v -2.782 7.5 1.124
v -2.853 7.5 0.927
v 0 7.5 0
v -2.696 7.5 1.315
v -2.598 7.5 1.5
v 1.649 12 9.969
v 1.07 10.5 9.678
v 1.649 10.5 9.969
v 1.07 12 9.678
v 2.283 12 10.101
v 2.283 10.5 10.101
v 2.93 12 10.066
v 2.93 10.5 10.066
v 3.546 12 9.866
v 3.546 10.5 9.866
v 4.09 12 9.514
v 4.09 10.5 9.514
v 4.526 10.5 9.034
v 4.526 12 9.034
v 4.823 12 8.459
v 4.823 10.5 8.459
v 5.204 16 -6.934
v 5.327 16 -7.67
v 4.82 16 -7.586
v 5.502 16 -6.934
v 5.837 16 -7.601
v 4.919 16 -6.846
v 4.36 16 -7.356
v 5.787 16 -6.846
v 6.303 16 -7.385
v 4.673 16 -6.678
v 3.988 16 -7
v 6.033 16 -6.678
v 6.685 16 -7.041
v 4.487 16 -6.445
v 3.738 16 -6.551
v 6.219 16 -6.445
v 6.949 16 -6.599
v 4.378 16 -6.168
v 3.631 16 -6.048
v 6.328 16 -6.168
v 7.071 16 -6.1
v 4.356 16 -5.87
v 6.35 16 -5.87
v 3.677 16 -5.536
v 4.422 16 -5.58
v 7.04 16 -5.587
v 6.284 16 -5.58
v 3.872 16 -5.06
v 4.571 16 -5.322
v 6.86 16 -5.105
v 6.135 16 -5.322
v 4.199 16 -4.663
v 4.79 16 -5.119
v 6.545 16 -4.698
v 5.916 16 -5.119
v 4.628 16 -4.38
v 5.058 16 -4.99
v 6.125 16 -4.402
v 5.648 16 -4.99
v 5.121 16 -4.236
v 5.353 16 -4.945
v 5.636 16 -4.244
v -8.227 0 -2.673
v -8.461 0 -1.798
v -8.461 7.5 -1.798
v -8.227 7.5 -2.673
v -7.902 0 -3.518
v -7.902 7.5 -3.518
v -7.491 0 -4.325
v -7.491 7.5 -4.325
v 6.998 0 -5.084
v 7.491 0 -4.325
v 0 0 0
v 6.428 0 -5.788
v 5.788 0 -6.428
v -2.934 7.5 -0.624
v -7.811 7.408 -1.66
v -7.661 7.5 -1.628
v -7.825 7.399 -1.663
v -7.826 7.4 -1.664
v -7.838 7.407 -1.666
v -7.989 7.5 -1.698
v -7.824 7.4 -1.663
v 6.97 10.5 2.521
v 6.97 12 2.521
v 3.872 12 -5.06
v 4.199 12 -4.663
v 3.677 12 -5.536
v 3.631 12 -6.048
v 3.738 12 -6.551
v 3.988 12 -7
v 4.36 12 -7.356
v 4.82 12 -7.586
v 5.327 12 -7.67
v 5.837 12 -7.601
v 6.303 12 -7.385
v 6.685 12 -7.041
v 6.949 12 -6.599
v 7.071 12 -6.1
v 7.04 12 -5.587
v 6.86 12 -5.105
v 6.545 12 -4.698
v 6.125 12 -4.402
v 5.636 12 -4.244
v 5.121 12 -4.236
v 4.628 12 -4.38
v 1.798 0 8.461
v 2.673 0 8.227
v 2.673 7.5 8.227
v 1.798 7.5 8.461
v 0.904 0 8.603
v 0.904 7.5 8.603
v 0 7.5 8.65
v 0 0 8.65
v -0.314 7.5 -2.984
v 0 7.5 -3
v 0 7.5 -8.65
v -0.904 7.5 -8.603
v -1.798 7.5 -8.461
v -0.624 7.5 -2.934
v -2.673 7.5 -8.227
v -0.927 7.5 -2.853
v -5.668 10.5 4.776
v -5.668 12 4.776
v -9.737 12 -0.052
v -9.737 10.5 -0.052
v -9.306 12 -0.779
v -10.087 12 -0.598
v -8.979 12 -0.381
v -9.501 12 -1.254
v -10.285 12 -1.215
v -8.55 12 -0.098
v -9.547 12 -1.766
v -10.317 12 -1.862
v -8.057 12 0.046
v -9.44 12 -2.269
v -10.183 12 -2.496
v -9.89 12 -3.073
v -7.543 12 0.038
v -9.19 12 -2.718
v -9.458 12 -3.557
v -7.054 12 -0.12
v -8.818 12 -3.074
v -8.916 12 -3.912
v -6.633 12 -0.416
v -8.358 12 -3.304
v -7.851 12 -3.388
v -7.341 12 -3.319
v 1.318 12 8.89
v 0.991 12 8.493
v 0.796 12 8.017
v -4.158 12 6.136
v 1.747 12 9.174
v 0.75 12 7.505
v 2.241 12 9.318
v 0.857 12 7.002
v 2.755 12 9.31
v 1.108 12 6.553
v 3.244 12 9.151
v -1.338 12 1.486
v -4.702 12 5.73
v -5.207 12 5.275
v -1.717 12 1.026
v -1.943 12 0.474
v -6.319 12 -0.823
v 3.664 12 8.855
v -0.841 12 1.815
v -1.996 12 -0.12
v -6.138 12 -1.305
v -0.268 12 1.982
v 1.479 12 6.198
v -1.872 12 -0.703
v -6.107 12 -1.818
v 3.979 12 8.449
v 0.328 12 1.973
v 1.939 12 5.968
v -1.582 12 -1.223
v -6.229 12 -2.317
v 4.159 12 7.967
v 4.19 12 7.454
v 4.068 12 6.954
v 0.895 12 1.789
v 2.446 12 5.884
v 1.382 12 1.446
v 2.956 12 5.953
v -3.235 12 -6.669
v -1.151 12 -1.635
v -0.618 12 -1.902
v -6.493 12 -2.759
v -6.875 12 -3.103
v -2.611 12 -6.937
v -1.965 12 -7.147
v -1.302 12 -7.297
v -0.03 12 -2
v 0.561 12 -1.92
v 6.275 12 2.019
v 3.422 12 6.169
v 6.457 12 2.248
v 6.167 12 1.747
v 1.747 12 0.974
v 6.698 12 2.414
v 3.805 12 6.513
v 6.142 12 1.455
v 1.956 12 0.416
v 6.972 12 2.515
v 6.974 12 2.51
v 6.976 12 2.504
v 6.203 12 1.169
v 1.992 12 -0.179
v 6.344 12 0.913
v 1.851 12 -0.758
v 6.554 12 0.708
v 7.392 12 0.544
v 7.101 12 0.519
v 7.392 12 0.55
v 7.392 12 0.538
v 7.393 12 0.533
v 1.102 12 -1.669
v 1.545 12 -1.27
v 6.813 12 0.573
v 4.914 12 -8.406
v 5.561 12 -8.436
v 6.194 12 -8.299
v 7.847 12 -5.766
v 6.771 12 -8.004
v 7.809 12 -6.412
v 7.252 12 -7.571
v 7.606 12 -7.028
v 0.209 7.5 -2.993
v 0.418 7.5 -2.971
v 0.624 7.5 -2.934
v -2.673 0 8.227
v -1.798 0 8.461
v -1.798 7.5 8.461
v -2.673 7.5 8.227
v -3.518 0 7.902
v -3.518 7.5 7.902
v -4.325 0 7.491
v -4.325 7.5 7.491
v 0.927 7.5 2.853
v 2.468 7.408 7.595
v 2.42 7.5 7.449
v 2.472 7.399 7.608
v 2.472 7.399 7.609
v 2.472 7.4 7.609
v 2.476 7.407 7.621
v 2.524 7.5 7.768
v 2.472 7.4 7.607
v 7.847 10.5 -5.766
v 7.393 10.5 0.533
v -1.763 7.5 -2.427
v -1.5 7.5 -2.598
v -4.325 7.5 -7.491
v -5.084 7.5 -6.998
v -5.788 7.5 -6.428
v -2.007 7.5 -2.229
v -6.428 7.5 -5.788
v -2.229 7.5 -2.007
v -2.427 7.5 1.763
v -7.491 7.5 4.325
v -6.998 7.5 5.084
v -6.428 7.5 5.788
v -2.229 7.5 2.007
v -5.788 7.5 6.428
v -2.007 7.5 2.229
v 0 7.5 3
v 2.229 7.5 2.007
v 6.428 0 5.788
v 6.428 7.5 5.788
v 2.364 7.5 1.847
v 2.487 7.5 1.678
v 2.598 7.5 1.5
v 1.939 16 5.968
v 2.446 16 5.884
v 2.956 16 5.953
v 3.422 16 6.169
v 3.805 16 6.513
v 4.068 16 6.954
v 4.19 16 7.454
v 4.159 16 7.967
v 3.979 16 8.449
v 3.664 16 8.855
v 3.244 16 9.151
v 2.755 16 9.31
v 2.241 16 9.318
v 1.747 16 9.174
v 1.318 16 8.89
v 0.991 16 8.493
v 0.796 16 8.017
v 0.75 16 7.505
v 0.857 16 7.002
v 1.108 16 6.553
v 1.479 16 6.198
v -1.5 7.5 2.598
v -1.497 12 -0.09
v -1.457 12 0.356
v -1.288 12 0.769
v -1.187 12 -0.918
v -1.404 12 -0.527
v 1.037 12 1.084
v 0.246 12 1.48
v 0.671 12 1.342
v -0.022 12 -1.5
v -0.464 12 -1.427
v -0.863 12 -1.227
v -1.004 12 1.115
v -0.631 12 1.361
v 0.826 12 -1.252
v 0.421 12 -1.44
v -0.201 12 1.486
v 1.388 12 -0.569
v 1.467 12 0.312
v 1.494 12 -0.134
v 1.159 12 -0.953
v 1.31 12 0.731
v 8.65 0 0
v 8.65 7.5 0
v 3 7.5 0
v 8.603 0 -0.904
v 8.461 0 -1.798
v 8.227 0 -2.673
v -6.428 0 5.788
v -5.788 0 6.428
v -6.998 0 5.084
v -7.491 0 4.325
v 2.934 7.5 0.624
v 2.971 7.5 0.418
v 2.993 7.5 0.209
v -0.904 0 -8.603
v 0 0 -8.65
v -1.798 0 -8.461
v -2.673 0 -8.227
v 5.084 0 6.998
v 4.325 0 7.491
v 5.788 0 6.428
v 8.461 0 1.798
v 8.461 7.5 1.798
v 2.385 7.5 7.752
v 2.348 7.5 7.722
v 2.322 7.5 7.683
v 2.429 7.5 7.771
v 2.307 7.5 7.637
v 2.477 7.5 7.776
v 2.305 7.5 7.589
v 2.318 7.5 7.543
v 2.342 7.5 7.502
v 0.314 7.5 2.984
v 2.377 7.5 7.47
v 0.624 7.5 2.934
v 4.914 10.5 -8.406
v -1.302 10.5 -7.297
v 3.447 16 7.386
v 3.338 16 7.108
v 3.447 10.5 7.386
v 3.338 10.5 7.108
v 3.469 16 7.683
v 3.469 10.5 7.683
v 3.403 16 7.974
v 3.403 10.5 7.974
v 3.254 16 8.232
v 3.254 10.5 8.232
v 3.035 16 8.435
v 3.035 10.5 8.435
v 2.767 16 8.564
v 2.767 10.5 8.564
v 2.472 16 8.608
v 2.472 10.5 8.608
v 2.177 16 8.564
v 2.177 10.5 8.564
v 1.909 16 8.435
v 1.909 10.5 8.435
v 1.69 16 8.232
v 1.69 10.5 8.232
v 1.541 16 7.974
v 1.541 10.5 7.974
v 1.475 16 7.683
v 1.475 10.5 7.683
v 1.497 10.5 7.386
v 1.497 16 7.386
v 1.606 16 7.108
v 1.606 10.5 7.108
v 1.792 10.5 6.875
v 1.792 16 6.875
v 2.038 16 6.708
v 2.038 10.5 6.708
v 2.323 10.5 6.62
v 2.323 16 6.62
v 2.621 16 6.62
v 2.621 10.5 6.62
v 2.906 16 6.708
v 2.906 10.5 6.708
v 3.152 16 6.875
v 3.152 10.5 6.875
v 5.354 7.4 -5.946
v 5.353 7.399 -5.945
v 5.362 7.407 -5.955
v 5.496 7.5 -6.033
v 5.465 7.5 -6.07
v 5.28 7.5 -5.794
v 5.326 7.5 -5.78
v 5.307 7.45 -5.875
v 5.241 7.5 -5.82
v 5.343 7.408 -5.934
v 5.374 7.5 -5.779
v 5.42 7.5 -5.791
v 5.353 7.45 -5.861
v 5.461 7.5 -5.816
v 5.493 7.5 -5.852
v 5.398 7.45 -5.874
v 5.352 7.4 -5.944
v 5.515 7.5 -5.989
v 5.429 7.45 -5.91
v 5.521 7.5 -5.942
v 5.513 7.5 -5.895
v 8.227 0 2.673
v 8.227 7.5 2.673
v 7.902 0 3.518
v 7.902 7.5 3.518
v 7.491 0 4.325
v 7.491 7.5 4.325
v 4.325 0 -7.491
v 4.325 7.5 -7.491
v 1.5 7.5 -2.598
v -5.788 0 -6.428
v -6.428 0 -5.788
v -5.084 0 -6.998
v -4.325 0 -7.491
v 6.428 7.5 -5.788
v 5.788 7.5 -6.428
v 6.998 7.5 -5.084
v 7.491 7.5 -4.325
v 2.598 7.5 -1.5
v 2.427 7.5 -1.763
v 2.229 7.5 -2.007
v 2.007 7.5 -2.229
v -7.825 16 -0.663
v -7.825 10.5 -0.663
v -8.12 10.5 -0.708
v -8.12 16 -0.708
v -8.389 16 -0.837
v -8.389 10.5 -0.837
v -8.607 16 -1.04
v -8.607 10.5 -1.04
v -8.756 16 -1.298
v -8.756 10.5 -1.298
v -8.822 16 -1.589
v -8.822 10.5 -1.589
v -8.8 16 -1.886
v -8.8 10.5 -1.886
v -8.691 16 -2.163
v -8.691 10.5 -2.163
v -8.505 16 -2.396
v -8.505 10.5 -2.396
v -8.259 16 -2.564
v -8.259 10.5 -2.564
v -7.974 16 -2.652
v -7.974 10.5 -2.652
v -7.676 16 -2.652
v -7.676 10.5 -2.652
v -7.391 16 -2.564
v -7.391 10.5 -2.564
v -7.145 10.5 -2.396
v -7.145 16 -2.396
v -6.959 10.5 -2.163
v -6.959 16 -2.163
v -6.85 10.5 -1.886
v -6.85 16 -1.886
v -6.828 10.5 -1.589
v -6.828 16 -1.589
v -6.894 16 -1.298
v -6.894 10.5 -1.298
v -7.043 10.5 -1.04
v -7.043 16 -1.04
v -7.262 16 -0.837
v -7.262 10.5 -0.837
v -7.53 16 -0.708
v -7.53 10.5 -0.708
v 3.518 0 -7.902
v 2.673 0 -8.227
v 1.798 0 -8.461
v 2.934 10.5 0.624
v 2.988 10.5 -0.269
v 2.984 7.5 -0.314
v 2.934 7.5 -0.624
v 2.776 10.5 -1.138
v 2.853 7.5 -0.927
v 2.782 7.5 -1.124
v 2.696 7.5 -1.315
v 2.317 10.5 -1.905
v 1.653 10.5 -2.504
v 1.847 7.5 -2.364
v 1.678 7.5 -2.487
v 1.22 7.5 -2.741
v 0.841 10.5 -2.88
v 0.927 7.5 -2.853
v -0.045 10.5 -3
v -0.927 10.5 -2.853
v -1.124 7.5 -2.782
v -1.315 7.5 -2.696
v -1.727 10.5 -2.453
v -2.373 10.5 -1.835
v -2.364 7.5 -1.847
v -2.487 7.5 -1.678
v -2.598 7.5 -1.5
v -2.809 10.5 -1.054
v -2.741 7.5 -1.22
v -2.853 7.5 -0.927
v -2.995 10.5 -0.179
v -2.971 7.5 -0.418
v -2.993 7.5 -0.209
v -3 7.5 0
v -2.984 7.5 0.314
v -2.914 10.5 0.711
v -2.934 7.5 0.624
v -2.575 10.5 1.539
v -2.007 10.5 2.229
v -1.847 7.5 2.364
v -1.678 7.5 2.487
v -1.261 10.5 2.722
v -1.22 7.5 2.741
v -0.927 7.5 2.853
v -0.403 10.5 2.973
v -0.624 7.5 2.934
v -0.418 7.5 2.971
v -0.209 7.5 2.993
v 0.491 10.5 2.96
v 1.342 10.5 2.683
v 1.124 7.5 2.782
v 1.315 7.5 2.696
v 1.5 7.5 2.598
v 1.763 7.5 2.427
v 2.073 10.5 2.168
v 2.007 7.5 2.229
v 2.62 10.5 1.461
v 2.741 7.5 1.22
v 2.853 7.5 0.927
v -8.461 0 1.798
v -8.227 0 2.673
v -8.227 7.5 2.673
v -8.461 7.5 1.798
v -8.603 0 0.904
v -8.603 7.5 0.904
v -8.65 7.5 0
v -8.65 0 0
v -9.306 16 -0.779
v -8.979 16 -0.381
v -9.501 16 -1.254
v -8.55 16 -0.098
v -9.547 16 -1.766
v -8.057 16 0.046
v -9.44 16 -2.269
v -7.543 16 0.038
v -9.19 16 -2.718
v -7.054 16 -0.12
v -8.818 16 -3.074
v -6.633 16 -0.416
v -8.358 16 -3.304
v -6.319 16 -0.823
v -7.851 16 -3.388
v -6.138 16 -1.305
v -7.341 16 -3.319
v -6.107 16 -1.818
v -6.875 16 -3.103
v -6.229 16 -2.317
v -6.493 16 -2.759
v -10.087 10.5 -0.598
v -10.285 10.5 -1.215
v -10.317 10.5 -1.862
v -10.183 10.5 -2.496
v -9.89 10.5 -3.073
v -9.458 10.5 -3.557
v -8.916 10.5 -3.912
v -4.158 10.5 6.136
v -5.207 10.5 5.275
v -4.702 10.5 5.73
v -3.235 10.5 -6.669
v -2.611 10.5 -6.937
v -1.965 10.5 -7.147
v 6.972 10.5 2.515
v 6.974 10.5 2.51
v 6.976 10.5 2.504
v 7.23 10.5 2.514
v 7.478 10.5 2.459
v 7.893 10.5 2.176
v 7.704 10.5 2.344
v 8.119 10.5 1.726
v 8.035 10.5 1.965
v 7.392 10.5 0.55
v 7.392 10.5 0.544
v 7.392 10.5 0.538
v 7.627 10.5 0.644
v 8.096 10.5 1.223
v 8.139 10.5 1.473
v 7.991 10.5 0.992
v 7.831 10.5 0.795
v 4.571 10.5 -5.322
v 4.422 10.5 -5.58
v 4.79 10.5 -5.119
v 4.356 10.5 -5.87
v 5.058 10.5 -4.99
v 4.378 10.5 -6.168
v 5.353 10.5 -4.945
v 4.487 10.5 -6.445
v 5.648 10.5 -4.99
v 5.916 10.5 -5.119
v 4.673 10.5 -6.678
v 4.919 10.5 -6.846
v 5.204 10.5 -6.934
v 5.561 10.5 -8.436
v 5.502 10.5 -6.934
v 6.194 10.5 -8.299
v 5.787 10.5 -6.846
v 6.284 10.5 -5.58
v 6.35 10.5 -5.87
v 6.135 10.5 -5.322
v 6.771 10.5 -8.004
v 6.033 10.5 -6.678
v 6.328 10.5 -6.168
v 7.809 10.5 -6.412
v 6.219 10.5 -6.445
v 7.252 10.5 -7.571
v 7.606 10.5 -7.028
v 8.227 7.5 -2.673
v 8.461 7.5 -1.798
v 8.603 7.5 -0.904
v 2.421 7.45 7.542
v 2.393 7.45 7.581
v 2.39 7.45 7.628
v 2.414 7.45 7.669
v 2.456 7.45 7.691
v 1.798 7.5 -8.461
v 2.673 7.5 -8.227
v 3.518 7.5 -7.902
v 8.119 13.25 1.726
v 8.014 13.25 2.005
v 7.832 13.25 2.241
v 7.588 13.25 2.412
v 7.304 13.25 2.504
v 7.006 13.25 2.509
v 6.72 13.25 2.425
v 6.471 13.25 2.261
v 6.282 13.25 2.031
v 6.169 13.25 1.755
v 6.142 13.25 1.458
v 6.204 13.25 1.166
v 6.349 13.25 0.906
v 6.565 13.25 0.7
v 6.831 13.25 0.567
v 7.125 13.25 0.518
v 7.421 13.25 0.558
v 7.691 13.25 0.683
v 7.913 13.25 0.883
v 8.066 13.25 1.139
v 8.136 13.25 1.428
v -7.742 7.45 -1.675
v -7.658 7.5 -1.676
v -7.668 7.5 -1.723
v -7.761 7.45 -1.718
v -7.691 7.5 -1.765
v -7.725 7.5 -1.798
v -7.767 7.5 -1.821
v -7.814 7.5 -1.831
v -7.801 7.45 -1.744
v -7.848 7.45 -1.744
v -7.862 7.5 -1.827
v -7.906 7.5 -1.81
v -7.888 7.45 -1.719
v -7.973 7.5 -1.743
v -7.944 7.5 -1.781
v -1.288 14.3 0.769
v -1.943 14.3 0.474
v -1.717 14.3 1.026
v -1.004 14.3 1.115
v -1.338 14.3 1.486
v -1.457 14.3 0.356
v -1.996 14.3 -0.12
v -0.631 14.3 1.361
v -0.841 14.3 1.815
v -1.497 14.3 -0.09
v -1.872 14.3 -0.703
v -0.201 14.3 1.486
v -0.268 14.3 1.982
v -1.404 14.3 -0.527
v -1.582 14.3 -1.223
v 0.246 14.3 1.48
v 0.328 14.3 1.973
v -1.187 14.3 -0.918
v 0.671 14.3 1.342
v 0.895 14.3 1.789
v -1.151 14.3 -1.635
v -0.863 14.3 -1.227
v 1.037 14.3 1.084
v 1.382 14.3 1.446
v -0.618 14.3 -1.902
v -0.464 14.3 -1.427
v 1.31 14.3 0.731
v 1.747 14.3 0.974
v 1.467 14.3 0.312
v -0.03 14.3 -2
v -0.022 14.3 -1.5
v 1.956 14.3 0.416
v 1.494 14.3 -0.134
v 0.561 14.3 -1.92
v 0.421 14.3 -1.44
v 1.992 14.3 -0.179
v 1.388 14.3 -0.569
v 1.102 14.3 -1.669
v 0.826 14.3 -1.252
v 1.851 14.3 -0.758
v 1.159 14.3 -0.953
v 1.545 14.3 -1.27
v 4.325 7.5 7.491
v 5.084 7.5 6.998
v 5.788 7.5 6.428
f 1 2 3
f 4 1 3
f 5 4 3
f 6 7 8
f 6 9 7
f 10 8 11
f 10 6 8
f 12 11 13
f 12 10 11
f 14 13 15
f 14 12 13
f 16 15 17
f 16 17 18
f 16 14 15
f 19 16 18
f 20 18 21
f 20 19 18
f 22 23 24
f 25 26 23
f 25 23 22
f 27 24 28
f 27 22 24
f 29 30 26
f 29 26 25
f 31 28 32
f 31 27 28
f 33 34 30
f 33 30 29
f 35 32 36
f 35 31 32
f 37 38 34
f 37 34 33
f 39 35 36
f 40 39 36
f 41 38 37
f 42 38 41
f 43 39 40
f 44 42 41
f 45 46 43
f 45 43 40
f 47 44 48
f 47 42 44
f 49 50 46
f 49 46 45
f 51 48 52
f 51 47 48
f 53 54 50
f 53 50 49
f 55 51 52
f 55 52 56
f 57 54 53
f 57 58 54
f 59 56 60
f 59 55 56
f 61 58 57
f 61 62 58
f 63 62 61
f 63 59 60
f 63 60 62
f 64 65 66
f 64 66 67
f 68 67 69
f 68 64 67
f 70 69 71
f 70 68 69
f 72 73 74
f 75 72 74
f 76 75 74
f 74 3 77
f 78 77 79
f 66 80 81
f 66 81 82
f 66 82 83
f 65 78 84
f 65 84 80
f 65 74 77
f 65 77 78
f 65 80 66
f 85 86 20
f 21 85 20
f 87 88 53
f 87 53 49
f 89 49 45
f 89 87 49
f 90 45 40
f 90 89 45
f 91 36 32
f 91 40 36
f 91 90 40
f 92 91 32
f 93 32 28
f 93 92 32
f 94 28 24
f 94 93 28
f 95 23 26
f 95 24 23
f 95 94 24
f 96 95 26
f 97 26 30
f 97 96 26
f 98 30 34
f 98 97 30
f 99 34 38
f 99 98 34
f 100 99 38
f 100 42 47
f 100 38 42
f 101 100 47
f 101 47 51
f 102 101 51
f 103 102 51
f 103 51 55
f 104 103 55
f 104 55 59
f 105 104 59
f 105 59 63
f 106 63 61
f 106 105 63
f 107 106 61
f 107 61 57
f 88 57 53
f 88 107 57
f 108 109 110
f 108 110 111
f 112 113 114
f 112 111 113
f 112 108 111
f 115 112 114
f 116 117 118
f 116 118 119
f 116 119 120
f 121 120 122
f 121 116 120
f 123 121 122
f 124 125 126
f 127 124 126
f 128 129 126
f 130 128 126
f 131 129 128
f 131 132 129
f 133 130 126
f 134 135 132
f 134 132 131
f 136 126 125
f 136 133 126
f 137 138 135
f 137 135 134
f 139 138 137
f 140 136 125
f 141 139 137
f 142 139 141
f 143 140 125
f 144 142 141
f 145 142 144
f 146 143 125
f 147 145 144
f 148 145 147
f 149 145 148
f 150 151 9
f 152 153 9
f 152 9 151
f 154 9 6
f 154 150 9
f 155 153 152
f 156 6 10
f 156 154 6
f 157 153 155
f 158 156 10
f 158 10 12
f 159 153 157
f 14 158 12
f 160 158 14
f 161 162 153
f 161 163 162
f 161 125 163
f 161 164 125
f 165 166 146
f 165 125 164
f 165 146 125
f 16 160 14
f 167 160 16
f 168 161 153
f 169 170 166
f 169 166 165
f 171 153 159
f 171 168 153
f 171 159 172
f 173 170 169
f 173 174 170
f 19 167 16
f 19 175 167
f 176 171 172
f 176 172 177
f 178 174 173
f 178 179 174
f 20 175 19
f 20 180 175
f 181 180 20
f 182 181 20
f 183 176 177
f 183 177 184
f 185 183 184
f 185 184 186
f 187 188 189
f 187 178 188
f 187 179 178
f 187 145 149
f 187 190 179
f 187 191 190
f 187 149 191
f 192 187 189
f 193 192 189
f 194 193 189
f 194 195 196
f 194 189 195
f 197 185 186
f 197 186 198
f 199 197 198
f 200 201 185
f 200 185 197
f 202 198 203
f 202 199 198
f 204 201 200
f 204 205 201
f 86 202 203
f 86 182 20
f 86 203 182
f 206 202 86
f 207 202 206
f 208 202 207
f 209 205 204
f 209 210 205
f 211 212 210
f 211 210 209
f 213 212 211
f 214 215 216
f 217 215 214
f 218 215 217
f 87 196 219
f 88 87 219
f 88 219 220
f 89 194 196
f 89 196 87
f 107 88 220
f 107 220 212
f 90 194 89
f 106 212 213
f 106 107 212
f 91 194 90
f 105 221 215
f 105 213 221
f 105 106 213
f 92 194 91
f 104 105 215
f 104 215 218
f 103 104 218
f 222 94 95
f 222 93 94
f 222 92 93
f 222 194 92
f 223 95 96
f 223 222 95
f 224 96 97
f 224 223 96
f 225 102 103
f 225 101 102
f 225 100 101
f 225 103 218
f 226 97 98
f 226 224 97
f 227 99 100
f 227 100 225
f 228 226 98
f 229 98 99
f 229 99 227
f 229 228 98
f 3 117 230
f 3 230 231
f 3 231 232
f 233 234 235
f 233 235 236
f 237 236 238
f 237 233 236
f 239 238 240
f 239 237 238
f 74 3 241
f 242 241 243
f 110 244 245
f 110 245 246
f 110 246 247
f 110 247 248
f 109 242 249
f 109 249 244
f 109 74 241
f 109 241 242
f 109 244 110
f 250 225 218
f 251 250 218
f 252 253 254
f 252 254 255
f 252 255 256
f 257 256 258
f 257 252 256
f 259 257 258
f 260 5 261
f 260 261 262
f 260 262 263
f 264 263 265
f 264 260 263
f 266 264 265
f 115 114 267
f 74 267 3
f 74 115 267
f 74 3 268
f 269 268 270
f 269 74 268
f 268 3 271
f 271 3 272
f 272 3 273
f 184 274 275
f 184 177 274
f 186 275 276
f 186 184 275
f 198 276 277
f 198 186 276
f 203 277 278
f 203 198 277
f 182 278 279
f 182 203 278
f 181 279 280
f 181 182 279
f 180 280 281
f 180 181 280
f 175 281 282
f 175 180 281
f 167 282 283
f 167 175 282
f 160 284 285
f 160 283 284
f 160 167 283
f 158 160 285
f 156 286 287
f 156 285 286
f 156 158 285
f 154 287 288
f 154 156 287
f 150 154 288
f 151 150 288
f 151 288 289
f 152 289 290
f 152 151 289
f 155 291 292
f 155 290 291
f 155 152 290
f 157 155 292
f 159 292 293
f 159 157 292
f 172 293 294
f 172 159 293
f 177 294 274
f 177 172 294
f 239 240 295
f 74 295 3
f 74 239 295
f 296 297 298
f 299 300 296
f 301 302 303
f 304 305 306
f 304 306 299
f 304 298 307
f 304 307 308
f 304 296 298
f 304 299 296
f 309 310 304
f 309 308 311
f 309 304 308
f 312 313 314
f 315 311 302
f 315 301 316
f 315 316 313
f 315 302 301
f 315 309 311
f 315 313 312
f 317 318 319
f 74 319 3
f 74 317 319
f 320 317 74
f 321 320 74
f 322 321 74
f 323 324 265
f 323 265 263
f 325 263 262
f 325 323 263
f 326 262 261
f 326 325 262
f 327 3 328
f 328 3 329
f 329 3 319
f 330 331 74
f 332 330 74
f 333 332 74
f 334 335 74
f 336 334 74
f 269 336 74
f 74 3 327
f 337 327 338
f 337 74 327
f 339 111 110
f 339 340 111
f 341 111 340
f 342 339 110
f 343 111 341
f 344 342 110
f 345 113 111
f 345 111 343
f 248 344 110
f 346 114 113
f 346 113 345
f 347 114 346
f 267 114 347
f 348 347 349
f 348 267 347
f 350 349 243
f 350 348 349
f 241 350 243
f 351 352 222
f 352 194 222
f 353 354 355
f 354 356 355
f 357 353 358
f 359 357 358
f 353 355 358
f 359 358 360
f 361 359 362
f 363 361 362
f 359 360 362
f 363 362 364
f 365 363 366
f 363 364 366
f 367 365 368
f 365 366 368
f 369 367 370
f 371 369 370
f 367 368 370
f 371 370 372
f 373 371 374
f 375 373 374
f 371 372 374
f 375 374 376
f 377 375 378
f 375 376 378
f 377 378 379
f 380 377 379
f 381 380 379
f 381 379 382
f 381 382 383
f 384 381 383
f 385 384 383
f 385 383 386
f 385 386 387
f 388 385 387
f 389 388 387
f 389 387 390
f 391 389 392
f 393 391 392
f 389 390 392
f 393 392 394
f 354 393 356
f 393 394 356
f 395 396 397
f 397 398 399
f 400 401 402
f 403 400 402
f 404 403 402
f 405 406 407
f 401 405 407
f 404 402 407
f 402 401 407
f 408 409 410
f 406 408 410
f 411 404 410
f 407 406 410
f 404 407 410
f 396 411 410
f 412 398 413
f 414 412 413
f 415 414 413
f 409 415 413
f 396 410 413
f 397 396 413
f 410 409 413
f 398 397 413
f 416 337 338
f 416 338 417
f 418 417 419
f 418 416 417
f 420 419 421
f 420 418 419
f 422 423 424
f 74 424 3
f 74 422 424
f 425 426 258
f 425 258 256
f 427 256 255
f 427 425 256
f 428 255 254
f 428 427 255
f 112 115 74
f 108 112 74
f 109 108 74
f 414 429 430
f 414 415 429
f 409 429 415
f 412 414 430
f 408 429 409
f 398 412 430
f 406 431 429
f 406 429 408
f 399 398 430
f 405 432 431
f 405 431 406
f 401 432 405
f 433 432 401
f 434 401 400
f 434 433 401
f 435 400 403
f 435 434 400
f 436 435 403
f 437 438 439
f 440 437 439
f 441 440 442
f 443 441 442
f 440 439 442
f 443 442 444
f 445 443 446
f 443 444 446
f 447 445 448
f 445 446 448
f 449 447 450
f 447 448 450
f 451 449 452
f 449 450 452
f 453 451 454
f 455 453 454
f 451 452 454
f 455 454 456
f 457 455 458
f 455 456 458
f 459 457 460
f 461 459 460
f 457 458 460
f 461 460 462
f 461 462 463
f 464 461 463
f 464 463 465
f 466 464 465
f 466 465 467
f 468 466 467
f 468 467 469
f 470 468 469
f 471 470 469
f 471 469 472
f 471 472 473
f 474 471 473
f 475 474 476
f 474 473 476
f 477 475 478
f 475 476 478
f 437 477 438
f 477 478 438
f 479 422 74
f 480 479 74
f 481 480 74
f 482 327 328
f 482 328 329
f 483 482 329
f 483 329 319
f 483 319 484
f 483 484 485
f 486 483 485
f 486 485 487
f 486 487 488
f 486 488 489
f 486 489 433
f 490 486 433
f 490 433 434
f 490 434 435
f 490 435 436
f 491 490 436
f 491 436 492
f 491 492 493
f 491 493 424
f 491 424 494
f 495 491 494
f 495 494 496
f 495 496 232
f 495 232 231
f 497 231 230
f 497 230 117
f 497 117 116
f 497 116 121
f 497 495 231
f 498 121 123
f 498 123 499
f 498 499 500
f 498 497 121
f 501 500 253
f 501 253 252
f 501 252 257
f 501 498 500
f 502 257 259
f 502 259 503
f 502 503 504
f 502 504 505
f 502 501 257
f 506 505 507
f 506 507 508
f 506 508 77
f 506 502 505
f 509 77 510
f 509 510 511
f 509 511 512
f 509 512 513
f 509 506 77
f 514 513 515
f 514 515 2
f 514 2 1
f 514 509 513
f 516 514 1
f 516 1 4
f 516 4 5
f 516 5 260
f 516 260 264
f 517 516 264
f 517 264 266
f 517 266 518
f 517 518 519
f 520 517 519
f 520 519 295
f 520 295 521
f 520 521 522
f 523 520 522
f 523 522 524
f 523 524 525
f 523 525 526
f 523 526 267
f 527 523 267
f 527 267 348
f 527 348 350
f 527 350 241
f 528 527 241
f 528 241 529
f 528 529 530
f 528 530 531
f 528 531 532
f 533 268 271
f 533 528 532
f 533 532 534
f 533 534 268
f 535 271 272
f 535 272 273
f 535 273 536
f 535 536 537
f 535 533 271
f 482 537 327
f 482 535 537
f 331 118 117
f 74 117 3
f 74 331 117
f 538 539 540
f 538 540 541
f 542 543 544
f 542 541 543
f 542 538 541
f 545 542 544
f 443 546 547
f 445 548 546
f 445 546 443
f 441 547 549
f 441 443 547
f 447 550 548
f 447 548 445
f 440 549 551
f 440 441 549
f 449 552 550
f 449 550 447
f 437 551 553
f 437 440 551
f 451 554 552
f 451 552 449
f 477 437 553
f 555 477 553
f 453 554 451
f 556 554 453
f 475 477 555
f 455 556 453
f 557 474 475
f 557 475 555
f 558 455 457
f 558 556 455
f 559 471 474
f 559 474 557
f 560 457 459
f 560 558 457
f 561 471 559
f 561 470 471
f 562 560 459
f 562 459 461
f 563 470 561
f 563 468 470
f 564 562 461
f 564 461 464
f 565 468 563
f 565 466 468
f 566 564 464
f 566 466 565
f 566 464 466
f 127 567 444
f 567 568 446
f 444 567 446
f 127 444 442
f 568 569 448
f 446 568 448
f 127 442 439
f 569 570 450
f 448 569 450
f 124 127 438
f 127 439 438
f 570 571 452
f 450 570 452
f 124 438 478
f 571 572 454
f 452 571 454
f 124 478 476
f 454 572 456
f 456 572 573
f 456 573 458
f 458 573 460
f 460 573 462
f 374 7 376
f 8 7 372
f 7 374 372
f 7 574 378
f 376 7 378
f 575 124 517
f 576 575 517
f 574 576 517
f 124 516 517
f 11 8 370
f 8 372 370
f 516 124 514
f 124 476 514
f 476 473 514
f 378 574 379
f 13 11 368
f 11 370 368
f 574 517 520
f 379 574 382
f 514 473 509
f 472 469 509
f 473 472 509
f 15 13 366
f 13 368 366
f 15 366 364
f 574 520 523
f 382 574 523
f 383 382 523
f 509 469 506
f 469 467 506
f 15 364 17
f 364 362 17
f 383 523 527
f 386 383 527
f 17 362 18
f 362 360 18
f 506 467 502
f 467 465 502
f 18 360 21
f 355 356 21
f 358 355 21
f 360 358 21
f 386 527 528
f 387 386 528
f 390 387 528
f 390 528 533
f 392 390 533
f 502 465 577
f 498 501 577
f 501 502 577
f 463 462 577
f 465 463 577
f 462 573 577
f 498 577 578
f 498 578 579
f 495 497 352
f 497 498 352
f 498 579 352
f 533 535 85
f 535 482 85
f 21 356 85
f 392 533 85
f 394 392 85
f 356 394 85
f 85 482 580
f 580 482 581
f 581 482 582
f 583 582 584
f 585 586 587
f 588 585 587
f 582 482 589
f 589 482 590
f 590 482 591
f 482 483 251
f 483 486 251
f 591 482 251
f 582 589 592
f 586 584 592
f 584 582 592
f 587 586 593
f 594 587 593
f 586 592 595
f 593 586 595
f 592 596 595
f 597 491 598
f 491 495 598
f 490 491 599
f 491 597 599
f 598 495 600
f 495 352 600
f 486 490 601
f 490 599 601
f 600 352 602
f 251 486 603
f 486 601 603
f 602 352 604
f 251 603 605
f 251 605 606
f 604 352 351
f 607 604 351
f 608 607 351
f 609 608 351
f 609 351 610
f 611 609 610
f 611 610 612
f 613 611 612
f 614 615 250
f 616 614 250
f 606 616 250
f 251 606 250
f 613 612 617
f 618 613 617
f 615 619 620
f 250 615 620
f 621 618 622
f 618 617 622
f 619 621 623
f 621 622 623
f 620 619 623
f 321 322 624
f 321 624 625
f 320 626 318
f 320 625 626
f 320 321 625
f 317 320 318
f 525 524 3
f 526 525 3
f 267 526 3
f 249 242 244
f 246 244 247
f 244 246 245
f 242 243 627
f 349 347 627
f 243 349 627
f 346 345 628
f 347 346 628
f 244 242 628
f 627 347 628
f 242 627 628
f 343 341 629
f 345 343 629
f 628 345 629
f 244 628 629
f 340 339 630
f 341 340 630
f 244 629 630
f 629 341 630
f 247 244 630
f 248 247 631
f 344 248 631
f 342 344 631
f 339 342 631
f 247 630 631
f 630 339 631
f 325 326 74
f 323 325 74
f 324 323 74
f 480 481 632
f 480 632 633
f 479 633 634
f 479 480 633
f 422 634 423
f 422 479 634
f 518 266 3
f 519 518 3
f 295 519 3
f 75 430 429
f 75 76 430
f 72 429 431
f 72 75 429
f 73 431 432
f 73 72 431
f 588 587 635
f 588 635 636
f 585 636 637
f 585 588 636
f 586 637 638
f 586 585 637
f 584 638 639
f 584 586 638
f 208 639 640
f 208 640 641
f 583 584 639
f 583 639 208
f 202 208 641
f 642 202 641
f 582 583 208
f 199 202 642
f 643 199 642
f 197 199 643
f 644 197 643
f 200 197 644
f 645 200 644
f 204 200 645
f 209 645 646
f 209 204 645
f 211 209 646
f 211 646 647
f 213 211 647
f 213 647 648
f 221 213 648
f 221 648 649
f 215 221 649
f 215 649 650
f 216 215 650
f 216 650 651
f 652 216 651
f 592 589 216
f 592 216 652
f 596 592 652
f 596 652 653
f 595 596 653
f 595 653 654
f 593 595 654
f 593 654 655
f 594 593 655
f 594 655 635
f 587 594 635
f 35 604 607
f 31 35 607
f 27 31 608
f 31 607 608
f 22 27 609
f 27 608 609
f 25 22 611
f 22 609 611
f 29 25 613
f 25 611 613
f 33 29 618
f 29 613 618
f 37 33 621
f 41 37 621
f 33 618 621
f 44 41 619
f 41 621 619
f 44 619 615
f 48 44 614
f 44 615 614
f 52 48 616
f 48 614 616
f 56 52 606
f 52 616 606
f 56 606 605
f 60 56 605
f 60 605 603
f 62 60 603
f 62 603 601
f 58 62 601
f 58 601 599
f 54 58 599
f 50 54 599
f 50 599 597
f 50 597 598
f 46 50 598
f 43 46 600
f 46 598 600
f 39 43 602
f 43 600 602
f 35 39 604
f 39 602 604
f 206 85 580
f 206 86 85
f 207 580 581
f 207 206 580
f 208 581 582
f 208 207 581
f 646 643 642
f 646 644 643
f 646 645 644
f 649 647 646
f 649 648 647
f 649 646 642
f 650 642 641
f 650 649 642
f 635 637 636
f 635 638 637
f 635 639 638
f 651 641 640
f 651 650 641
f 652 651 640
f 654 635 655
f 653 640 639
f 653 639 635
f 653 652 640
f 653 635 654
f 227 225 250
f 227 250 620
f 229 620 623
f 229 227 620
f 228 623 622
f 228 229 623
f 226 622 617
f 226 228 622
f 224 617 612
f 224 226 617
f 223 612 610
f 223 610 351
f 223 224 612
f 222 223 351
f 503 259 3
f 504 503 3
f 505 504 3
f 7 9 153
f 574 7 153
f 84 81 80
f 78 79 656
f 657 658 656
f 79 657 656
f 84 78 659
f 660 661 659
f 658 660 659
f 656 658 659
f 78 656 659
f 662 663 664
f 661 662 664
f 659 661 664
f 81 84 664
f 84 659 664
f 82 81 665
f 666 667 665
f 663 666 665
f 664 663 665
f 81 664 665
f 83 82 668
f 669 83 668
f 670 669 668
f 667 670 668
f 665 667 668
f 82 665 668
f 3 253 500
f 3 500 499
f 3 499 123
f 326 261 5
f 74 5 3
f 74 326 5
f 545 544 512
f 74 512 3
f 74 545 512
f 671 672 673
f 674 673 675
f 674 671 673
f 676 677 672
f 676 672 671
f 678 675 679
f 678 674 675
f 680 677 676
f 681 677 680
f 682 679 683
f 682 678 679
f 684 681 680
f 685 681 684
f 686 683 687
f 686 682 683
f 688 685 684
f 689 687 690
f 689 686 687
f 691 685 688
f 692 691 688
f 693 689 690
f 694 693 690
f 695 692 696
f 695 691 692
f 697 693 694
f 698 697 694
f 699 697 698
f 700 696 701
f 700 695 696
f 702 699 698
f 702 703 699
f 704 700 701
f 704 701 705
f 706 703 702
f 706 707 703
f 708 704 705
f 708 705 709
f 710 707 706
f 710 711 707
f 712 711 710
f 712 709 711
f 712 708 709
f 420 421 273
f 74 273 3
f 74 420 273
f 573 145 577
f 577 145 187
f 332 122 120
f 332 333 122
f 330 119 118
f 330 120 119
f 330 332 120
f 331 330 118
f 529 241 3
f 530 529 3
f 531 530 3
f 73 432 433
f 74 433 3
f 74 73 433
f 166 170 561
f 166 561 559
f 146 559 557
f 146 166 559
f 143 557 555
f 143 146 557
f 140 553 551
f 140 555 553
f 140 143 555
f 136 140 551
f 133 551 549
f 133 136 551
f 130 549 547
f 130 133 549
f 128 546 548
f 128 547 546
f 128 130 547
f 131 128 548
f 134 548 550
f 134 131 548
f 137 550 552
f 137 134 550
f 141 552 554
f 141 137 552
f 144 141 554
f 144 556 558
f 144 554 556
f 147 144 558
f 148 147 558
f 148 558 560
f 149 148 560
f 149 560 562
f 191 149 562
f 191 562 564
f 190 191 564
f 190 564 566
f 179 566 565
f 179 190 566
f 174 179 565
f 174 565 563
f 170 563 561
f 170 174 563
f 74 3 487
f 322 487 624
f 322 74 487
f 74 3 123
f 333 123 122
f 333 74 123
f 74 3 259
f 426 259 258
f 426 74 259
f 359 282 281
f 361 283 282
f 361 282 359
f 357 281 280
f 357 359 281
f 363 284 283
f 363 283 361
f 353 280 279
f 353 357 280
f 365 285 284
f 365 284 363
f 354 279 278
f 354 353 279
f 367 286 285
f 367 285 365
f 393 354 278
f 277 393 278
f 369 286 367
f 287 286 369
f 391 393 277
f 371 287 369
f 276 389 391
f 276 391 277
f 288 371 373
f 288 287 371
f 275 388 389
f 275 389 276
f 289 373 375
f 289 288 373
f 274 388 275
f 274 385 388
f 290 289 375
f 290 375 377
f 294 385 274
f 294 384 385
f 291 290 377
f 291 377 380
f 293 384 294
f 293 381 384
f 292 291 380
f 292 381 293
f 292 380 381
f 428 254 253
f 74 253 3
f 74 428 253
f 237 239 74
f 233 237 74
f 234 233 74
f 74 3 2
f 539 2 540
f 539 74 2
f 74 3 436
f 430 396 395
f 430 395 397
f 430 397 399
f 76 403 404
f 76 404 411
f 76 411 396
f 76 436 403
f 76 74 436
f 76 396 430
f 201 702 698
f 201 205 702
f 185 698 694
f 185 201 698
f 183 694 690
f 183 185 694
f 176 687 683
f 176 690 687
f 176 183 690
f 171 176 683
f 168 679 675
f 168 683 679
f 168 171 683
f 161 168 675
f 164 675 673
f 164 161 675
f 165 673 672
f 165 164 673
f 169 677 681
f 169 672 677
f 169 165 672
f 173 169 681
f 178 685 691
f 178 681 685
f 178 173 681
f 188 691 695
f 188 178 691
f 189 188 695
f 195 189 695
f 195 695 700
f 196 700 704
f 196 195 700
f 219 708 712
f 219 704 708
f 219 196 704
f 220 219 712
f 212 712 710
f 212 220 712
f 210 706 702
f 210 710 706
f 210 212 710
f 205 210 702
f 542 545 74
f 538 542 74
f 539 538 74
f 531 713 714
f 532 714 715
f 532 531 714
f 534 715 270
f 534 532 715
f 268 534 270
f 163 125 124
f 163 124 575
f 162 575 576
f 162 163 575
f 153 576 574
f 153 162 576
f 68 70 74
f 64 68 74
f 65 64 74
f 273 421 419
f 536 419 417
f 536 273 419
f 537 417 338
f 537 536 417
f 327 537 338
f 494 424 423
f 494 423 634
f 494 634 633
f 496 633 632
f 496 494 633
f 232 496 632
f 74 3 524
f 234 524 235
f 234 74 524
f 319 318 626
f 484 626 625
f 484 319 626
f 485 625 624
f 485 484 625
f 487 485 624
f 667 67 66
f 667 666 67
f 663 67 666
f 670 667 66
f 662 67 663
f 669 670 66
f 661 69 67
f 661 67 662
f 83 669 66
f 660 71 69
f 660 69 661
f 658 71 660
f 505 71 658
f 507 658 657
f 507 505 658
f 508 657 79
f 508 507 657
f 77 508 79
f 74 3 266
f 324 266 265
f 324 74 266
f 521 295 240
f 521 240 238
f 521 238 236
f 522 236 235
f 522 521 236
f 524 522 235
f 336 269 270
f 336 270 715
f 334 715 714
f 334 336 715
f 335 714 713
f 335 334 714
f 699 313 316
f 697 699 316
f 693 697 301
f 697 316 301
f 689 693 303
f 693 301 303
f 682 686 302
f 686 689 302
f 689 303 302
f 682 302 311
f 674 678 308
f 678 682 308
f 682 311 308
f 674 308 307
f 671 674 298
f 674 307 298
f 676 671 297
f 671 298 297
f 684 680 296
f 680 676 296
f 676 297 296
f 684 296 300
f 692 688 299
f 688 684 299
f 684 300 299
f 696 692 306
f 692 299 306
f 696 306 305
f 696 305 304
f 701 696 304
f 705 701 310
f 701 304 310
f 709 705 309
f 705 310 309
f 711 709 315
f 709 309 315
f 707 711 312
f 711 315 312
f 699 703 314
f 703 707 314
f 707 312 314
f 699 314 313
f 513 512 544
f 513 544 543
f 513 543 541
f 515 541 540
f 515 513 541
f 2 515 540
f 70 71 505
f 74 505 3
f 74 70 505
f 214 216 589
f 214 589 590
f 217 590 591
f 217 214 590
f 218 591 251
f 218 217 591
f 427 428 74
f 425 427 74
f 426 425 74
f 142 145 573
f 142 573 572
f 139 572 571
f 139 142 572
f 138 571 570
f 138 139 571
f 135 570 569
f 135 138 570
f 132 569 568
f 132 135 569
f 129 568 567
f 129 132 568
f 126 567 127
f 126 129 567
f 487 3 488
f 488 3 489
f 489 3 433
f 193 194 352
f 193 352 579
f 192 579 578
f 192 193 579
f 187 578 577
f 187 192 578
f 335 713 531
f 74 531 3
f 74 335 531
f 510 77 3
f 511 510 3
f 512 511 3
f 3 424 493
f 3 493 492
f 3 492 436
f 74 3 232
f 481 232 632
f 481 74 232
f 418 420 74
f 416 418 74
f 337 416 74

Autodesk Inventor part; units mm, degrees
ref_plane "YZ Plane" through (0, 0, 0) normal (1, 0, 0) x (0, 1, 0)
ref_plane "XZ Plane" through (0, 0, 0) normal (0, 1, 0) x (-1, 0, 0)
sketch "Sketch1" plane through (0, 0, 0) normal (0, 1, 0) x (-1, 0, 0)
  arc A0 (0, -8.65) -> (2.673, -8.2266) centre (0, 0) ccw
  line L0 (0, 0) -> (2.673, -8.2266) construction
  line L1 (0, 0) -> (0, -8.65) construction
  line L2 (0, 0) -> (2.673, -8.2266)
  line L3 (0, -8.65) -> (0, 0)
  dimension "d0" = 8.65
  dimension "d1" = 18
extrude "Extrusion1" add sketch "Sketch1" along normal blind 7.5
pattern_circular "Circular Pattern1" count 12 over 360 about axis through (0, -10, 0) along (0, 1, 0) of "Extrusion1"
ref_plane "Work Plane1" through (-8.461, 12, -1.7984) normal (0, 1, 0) x (0.9781, 0, 0.2079)
sketch "Sketch2" plane through (-8.461, 12, -1.7984) normal (0, 1, 0) x (0.9781, 0, 0.2079)
  line L0 (8.65, 0) -> (0, 0) projected
  circle A0 centre (0.65, 0) radius 2.5
  circle A1 centre (12.65, -6.9282) radius 2.5
  circle A2 centre (12.65, 6.9282) radius 2.5
  line L1 (5.859, 6.8666) -> (11.7086, 9.2442)
  line L2 (15.1264, 7.271) -> (15.9921, 1.0162)
  line L3 (15.9921, -1.0162) -> (15.1264, -7.271)
  line L4 (11.7086, -9.2442) -> (5.859, -6.8666)
  line L5 (4.325, -7.4911) -> (8.65, 0) projected
  line L6 (4.0989, -5.8503) -> (-0.885, -1.9732)
  line L7 (-0.885, 1.9732) -> (4.0989, 5.8503)
  arc A3 (15.9921, -1.0162) -> (15.9921, 1.0162) centre (8.65, 0) ccw
  arc A4 (5.859, 6.8666) -> (4.0989, 5.8503) centre (8.65, 0) ccw
  arc A5 (4.0989, -5.8503) -> (5.859, -6.8666) centre (8.65, 0) ccw
  point P0 (15.1264, 7.271)
  point P1 (-0.885, 1.9732)
  dimension "d9" = 5
  dimension "d12" = 360
  dimension "d23" = 8
extrude "Extrusion2" add sketch "Sketch2" against normal blind 1.5
sketch "Sketch3" plane through (-8.461, 12, -1.7984) normal (0, 1, 0) x (0.9781, 0, 0.2079)
  circle A0 centre (8.65, 0) radius 3
  dimension "d16" = 6
extrude "Extrusion3" add sketch "Sketch3" against normal up to surface (4.5 mm away)
sketch "Sketch4" plane through (-8.461, 12, -1.7984) normal (0, 1, 0) x (0.9781, 0, 0.2079)
  line L0 (8.65, 0) -> (0, 0) projected
  circle A0 centre (0.65, 0) radius 1.725
  dimension "d19" = 3.45
  dimension "d20" = 8
extrude "Extrusion4" add sketch "Sketch4" along normal blind 4
hole "Hole1" at (-7.8252, 16, -1.6633) direction (0, -1, 0) diameter 2 depth 8 tip angle 118
pattern_circular "Circular Pattern2" count 3 over 360 about axis through (0, -10, 0) along (0, 1, 0) of "Extrusion4", "Hole1"
sketch "Sketch5" plane through (-8.461, 12, -1.7984) normal (0, 1, 0) x (0.9781, 0, 0.2079)
  line L0 (8.65, 0) -> (17.3, 0) projected
  circle A0 centre (15.95, 0) radius 1
  dimension "d36" = 2
  dimension "d37" = 7.3
extrude "Extrusion5" add sketch "Sketch5" along normal blind 1.25 and the other way blind 1.5
sketch "Sketch6" plane through (-8.461, 12, -1.7984) normal (0, 1, 0) x (0.9781, 0, 0.2079)
  circle A0 centre (8.65, 0) radius 2
  circle A1 centre (8.65, 0) radius 1.5
  dimension "d42" = 4
  dimension "d43" = 3
extrude "Extrusion6" add sketch "Sketch6" along normal blind 2.3
properties part number "motor_GM1806-80T_SkyproRO" material "Iron, Cast"
